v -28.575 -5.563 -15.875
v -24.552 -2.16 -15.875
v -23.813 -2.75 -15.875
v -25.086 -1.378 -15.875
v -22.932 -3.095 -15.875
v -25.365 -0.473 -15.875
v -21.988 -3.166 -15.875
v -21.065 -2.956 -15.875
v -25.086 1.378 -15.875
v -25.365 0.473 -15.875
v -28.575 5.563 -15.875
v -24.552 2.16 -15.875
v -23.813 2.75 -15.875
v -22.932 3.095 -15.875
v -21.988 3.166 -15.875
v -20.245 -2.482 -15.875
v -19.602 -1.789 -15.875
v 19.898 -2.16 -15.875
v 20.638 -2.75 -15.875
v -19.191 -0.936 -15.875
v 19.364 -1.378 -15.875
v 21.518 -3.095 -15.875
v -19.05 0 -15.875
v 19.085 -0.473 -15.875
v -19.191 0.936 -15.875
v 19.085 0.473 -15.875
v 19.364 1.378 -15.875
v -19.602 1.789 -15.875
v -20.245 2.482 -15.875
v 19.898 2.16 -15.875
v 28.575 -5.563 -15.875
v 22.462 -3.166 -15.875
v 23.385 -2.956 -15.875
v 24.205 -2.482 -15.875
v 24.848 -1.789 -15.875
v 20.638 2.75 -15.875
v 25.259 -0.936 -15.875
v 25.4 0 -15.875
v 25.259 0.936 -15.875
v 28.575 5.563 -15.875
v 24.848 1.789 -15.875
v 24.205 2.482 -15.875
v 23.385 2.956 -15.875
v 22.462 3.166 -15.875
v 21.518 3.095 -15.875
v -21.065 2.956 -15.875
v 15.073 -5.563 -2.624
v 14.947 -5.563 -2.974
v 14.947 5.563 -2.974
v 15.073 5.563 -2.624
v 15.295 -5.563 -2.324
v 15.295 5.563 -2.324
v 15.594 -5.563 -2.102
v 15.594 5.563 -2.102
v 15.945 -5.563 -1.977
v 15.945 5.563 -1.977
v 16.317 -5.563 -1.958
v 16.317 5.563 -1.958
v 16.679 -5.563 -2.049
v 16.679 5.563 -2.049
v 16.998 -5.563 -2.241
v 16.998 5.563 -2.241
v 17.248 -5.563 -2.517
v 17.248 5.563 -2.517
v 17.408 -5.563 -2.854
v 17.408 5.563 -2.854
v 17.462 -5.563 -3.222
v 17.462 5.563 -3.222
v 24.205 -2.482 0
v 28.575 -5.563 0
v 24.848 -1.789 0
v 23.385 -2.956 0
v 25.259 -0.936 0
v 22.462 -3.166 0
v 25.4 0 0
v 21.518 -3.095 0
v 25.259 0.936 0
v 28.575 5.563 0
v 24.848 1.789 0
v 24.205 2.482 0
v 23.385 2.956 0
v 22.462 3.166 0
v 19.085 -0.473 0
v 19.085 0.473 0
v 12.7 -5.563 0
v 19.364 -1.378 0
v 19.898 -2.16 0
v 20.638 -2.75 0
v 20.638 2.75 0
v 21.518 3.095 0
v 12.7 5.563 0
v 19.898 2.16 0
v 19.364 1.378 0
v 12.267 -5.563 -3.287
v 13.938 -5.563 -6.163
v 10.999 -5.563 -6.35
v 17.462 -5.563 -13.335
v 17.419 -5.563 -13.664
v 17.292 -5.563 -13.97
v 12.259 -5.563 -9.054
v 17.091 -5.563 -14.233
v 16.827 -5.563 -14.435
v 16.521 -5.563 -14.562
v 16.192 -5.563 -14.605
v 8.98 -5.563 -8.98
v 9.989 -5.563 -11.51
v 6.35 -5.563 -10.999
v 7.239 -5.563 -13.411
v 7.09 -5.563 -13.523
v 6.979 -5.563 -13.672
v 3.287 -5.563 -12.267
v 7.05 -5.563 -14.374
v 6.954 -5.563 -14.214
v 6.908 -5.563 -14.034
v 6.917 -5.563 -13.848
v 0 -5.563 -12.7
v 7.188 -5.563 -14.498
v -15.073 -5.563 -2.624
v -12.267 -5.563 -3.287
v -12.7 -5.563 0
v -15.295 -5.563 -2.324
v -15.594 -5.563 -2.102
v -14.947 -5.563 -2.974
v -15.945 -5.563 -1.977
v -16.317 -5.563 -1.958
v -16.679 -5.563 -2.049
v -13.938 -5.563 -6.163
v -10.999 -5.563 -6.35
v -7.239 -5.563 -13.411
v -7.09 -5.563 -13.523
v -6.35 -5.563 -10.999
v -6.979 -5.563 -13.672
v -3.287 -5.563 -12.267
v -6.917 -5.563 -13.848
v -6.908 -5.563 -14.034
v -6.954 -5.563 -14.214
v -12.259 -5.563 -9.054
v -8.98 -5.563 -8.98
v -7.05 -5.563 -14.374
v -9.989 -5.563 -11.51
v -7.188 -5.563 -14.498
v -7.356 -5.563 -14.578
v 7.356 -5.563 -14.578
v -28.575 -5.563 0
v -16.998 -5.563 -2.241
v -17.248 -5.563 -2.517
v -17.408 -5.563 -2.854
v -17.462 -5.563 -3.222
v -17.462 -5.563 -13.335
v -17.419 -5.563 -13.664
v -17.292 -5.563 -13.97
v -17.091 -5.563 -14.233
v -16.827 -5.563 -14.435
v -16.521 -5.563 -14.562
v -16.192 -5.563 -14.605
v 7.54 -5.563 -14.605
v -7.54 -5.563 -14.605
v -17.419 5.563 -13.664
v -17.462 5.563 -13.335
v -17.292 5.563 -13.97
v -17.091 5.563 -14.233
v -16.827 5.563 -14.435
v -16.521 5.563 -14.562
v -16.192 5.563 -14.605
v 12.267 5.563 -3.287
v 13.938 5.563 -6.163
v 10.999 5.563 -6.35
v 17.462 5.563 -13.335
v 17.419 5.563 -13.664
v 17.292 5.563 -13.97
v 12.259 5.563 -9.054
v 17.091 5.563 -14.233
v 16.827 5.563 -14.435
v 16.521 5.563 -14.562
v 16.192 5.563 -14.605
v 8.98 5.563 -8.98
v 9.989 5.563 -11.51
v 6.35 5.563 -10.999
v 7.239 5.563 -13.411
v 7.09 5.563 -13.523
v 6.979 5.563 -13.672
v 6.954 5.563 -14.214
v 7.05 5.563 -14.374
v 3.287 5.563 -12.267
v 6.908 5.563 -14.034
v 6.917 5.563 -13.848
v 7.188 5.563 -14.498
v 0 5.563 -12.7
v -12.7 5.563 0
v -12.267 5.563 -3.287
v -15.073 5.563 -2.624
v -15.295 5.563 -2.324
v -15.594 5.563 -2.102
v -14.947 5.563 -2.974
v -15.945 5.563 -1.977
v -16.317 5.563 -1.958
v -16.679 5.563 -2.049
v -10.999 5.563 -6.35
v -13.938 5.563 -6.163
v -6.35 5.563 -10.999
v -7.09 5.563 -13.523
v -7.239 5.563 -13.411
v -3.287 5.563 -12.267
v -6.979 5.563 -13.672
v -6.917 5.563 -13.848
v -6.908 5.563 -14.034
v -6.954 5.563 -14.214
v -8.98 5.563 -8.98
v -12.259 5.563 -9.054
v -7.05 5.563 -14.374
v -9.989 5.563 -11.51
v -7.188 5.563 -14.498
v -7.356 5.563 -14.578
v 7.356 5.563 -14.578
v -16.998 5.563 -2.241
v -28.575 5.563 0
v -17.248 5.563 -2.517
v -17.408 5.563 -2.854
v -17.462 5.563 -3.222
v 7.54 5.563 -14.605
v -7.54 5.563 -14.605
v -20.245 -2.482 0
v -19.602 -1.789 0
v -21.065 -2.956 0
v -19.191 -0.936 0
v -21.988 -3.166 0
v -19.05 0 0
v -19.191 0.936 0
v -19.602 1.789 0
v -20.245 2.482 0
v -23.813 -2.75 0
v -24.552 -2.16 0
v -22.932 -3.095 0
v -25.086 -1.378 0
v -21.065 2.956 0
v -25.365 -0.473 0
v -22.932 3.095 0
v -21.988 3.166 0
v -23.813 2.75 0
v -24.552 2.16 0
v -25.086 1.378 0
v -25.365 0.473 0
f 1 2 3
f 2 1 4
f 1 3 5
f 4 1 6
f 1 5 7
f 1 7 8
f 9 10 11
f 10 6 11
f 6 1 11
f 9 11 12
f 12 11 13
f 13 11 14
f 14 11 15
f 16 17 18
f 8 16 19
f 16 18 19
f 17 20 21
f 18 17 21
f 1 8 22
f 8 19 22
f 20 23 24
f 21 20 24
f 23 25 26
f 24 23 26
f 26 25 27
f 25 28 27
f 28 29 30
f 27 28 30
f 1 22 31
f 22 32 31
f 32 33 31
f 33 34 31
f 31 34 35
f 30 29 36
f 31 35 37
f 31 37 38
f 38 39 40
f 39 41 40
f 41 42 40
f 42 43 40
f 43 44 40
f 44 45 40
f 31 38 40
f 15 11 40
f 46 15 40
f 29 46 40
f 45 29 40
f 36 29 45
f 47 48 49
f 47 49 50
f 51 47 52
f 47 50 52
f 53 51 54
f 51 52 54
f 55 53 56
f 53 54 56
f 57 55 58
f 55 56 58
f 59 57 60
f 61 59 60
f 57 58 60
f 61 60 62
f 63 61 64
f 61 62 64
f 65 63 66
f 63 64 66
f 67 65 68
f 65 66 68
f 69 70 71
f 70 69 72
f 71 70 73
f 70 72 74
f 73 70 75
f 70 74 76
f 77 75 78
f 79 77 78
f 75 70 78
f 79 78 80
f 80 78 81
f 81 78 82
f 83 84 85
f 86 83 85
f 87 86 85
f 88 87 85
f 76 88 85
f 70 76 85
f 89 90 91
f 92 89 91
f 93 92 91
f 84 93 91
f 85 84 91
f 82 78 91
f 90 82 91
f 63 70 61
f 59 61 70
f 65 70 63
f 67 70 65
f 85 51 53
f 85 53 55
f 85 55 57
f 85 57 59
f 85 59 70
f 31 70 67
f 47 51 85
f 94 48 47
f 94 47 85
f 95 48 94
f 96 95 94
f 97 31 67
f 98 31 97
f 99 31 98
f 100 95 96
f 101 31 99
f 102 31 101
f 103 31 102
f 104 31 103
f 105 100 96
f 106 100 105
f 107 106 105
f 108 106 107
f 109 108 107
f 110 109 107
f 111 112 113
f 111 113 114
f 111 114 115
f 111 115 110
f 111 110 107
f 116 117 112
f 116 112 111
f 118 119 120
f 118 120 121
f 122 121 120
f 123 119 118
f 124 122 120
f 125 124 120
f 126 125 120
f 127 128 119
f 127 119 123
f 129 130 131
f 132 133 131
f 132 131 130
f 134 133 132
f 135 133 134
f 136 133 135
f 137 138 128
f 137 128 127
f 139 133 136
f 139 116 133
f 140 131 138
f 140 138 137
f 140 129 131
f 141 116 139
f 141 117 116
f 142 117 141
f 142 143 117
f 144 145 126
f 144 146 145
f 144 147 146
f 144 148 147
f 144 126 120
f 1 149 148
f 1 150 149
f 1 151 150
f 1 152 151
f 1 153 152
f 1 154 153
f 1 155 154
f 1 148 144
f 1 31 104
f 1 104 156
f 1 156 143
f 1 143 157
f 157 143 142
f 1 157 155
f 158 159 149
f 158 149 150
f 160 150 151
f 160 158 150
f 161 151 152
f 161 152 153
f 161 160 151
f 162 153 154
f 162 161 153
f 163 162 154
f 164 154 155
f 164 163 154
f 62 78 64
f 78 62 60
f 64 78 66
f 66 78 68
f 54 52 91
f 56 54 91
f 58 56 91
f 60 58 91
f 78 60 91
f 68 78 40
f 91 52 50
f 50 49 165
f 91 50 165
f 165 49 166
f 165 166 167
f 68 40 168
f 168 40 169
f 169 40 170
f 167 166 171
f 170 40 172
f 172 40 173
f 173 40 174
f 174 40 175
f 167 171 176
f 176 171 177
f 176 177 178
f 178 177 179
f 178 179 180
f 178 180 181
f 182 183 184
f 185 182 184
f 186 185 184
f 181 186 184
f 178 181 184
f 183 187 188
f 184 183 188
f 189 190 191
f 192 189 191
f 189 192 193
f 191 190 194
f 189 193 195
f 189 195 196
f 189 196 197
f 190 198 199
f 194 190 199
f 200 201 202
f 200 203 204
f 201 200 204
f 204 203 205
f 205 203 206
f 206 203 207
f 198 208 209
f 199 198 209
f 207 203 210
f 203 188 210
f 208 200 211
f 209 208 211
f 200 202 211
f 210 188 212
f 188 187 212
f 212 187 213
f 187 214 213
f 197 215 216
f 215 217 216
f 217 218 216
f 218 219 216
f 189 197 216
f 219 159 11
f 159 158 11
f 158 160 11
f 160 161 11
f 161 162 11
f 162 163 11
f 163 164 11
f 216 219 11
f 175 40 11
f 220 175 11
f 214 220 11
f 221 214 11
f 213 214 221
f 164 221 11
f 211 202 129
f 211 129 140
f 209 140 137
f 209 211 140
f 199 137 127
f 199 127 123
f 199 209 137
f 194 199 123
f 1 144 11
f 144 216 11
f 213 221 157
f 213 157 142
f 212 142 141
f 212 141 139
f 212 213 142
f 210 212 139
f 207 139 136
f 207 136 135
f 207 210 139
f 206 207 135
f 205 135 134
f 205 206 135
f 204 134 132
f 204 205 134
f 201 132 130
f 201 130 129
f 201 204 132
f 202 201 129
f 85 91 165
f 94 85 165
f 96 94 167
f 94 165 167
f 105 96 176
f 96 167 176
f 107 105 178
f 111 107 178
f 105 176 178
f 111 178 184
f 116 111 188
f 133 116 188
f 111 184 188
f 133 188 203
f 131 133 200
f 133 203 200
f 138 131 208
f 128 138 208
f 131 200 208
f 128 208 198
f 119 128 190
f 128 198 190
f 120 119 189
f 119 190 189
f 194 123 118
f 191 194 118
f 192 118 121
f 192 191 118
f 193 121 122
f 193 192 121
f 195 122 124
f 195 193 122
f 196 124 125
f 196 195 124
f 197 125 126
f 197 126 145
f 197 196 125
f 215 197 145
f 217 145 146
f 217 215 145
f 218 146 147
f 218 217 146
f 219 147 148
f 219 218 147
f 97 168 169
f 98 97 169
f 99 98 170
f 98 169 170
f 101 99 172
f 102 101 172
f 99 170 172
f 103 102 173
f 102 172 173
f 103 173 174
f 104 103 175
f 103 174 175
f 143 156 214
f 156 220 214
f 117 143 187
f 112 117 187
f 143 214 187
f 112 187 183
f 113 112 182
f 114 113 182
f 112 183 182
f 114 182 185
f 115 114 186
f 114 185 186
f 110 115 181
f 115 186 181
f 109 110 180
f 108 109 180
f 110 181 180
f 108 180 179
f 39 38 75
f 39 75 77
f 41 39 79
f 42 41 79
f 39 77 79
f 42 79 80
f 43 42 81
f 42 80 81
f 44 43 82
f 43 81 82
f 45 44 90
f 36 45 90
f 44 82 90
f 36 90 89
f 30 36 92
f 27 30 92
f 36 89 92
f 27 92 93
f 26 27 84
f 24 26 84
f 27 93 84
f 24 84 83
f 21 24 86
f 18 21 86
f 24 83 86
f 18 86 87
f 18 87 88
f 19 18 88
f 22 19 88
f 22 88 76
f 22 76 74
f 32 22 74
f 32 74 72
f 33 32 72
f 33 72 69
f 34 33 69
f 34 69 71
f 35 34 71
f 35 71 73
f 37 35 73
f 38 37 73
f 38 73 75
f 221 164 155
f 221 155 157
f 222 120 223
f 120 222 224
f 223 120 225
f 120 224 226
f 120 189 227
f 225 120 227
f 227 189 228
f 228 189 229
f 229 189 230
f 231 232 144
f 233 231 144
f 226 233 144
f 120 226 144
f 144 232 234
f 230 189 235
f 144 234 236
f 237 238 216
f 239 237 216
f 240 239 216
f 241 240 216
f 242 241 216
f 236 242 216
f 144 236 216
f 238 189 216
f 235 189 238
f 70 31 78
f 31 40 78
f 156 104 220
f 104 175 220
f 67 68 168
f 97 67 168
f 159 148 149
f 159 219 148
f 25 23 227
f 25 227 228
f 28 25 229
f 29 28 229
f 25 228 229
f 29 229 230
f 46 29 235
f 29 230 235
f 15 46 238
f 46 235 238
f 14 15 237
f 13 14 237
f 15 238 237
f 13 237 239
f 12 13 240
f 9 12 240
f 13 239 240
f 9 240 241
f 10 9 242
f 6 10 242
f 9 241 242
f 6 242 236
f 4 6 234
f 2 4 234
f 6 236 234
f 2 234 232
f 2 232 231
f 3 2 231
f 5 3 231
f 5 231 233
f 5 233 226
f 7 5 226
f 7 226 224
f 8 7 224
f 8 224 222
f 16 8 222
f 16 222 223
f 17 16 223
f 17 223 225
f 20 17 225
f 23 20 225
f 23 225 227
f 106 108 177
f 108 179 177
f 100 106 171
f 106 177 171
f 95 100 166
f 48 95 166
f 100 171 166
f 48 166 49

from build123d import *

# Parameters (mm, degrees)
BOSS_EXTRUDE1_DEPTH = 5.5626
SKETCH2_R           = 3.175
CUT_EXTRUDE1_DEPTH  = 34.158539907


with BuildPart() as part:
    # Sketch1 → Boss-Extrude1 (new, symmetric)
    with BuildSketch(Plane(origin=(0, 0, 0), x_dir=(1, 0, 0), z_dir=(0, 1, 0))):
        with BuildLine():
            Line((-12.7, 0), (-28.575, 0))
            Line((-28.575, 0), (-28.575, 15.875))
            Line((-28.575, 15.875), (28.575, 15.875))
            Line((28.575, 15.875), (28.575, 0))
            Line((28.575, 0), (12.7, 0))
            ThreePointArc((12.7, 0), (0, 12.7), (-12.7, 0))
        make_face()
        with BuildLine():
            Line((16.1925, 14.605), (7.540207225, 14.605))
            ThreePointArc((7.540207225, 14.605), (6.924551883, 14.125542599), (7.238598936, 13.4112))
            ThreePointArc((7.238598936, 13.4112), (12.258915713, 9.054092199), (14.946923077, 2.974405913))
            ThreePointArc((14.946923077, 2.974405913), (16.317033746, 1.958393589), (17.4625, 3.222273072))
            Line((17.4625, 3.222273072), (17.4625, 13.335))
            ThreePointArc((17.4625, 13.335), (17.090525612, 14.233025612), (16.1925, 14.605))
        make_face(mode=Mode.SUBTRACT)
        with BuildLine():
            Line((-17.4625, 3.222273072), (-17.4625, 13.335))
            ThreePointArc((-17.4625, 13.335), (-17.090525612, 14.233025612), (-16.1925, 14.605))
            Line((-16.1925, 14.605), (-7.540207225, 14.605))
            ThreePointArc((-7.540207225, 14.605), (-6.924551883, 14.125542599), (-7.238598936, 13.4112))
            ThreePointArc((-7.238598936, 13.4112), (-12.258915713, 9.054092199), (-14.946923077, 2.974405913))
            ThreePointArc((-14.946923077, 2.974405913), (-16.317033746, 1.958393589), (-17.4625, 3.222273072))
        make_face(mode=Mode.SUBTRACT)
    extrude(amount=BOSS_EXTRUDE1_DEPTH, both=True)

    # Sketch2 → Cut-Extrude1 (cut, through all)
    with BuildSketch(Plane.XY):
        with Locations((-22.225, 0)):
            Circle(SKETCH2_R)
        with Locations((22.225, 0)):
            Circle(SKETCH2_R)
    extrude(amount=-CUT_EXTRUDE1_DEPTH, mode=Mode.SUBTRACT)


solid = part.part
